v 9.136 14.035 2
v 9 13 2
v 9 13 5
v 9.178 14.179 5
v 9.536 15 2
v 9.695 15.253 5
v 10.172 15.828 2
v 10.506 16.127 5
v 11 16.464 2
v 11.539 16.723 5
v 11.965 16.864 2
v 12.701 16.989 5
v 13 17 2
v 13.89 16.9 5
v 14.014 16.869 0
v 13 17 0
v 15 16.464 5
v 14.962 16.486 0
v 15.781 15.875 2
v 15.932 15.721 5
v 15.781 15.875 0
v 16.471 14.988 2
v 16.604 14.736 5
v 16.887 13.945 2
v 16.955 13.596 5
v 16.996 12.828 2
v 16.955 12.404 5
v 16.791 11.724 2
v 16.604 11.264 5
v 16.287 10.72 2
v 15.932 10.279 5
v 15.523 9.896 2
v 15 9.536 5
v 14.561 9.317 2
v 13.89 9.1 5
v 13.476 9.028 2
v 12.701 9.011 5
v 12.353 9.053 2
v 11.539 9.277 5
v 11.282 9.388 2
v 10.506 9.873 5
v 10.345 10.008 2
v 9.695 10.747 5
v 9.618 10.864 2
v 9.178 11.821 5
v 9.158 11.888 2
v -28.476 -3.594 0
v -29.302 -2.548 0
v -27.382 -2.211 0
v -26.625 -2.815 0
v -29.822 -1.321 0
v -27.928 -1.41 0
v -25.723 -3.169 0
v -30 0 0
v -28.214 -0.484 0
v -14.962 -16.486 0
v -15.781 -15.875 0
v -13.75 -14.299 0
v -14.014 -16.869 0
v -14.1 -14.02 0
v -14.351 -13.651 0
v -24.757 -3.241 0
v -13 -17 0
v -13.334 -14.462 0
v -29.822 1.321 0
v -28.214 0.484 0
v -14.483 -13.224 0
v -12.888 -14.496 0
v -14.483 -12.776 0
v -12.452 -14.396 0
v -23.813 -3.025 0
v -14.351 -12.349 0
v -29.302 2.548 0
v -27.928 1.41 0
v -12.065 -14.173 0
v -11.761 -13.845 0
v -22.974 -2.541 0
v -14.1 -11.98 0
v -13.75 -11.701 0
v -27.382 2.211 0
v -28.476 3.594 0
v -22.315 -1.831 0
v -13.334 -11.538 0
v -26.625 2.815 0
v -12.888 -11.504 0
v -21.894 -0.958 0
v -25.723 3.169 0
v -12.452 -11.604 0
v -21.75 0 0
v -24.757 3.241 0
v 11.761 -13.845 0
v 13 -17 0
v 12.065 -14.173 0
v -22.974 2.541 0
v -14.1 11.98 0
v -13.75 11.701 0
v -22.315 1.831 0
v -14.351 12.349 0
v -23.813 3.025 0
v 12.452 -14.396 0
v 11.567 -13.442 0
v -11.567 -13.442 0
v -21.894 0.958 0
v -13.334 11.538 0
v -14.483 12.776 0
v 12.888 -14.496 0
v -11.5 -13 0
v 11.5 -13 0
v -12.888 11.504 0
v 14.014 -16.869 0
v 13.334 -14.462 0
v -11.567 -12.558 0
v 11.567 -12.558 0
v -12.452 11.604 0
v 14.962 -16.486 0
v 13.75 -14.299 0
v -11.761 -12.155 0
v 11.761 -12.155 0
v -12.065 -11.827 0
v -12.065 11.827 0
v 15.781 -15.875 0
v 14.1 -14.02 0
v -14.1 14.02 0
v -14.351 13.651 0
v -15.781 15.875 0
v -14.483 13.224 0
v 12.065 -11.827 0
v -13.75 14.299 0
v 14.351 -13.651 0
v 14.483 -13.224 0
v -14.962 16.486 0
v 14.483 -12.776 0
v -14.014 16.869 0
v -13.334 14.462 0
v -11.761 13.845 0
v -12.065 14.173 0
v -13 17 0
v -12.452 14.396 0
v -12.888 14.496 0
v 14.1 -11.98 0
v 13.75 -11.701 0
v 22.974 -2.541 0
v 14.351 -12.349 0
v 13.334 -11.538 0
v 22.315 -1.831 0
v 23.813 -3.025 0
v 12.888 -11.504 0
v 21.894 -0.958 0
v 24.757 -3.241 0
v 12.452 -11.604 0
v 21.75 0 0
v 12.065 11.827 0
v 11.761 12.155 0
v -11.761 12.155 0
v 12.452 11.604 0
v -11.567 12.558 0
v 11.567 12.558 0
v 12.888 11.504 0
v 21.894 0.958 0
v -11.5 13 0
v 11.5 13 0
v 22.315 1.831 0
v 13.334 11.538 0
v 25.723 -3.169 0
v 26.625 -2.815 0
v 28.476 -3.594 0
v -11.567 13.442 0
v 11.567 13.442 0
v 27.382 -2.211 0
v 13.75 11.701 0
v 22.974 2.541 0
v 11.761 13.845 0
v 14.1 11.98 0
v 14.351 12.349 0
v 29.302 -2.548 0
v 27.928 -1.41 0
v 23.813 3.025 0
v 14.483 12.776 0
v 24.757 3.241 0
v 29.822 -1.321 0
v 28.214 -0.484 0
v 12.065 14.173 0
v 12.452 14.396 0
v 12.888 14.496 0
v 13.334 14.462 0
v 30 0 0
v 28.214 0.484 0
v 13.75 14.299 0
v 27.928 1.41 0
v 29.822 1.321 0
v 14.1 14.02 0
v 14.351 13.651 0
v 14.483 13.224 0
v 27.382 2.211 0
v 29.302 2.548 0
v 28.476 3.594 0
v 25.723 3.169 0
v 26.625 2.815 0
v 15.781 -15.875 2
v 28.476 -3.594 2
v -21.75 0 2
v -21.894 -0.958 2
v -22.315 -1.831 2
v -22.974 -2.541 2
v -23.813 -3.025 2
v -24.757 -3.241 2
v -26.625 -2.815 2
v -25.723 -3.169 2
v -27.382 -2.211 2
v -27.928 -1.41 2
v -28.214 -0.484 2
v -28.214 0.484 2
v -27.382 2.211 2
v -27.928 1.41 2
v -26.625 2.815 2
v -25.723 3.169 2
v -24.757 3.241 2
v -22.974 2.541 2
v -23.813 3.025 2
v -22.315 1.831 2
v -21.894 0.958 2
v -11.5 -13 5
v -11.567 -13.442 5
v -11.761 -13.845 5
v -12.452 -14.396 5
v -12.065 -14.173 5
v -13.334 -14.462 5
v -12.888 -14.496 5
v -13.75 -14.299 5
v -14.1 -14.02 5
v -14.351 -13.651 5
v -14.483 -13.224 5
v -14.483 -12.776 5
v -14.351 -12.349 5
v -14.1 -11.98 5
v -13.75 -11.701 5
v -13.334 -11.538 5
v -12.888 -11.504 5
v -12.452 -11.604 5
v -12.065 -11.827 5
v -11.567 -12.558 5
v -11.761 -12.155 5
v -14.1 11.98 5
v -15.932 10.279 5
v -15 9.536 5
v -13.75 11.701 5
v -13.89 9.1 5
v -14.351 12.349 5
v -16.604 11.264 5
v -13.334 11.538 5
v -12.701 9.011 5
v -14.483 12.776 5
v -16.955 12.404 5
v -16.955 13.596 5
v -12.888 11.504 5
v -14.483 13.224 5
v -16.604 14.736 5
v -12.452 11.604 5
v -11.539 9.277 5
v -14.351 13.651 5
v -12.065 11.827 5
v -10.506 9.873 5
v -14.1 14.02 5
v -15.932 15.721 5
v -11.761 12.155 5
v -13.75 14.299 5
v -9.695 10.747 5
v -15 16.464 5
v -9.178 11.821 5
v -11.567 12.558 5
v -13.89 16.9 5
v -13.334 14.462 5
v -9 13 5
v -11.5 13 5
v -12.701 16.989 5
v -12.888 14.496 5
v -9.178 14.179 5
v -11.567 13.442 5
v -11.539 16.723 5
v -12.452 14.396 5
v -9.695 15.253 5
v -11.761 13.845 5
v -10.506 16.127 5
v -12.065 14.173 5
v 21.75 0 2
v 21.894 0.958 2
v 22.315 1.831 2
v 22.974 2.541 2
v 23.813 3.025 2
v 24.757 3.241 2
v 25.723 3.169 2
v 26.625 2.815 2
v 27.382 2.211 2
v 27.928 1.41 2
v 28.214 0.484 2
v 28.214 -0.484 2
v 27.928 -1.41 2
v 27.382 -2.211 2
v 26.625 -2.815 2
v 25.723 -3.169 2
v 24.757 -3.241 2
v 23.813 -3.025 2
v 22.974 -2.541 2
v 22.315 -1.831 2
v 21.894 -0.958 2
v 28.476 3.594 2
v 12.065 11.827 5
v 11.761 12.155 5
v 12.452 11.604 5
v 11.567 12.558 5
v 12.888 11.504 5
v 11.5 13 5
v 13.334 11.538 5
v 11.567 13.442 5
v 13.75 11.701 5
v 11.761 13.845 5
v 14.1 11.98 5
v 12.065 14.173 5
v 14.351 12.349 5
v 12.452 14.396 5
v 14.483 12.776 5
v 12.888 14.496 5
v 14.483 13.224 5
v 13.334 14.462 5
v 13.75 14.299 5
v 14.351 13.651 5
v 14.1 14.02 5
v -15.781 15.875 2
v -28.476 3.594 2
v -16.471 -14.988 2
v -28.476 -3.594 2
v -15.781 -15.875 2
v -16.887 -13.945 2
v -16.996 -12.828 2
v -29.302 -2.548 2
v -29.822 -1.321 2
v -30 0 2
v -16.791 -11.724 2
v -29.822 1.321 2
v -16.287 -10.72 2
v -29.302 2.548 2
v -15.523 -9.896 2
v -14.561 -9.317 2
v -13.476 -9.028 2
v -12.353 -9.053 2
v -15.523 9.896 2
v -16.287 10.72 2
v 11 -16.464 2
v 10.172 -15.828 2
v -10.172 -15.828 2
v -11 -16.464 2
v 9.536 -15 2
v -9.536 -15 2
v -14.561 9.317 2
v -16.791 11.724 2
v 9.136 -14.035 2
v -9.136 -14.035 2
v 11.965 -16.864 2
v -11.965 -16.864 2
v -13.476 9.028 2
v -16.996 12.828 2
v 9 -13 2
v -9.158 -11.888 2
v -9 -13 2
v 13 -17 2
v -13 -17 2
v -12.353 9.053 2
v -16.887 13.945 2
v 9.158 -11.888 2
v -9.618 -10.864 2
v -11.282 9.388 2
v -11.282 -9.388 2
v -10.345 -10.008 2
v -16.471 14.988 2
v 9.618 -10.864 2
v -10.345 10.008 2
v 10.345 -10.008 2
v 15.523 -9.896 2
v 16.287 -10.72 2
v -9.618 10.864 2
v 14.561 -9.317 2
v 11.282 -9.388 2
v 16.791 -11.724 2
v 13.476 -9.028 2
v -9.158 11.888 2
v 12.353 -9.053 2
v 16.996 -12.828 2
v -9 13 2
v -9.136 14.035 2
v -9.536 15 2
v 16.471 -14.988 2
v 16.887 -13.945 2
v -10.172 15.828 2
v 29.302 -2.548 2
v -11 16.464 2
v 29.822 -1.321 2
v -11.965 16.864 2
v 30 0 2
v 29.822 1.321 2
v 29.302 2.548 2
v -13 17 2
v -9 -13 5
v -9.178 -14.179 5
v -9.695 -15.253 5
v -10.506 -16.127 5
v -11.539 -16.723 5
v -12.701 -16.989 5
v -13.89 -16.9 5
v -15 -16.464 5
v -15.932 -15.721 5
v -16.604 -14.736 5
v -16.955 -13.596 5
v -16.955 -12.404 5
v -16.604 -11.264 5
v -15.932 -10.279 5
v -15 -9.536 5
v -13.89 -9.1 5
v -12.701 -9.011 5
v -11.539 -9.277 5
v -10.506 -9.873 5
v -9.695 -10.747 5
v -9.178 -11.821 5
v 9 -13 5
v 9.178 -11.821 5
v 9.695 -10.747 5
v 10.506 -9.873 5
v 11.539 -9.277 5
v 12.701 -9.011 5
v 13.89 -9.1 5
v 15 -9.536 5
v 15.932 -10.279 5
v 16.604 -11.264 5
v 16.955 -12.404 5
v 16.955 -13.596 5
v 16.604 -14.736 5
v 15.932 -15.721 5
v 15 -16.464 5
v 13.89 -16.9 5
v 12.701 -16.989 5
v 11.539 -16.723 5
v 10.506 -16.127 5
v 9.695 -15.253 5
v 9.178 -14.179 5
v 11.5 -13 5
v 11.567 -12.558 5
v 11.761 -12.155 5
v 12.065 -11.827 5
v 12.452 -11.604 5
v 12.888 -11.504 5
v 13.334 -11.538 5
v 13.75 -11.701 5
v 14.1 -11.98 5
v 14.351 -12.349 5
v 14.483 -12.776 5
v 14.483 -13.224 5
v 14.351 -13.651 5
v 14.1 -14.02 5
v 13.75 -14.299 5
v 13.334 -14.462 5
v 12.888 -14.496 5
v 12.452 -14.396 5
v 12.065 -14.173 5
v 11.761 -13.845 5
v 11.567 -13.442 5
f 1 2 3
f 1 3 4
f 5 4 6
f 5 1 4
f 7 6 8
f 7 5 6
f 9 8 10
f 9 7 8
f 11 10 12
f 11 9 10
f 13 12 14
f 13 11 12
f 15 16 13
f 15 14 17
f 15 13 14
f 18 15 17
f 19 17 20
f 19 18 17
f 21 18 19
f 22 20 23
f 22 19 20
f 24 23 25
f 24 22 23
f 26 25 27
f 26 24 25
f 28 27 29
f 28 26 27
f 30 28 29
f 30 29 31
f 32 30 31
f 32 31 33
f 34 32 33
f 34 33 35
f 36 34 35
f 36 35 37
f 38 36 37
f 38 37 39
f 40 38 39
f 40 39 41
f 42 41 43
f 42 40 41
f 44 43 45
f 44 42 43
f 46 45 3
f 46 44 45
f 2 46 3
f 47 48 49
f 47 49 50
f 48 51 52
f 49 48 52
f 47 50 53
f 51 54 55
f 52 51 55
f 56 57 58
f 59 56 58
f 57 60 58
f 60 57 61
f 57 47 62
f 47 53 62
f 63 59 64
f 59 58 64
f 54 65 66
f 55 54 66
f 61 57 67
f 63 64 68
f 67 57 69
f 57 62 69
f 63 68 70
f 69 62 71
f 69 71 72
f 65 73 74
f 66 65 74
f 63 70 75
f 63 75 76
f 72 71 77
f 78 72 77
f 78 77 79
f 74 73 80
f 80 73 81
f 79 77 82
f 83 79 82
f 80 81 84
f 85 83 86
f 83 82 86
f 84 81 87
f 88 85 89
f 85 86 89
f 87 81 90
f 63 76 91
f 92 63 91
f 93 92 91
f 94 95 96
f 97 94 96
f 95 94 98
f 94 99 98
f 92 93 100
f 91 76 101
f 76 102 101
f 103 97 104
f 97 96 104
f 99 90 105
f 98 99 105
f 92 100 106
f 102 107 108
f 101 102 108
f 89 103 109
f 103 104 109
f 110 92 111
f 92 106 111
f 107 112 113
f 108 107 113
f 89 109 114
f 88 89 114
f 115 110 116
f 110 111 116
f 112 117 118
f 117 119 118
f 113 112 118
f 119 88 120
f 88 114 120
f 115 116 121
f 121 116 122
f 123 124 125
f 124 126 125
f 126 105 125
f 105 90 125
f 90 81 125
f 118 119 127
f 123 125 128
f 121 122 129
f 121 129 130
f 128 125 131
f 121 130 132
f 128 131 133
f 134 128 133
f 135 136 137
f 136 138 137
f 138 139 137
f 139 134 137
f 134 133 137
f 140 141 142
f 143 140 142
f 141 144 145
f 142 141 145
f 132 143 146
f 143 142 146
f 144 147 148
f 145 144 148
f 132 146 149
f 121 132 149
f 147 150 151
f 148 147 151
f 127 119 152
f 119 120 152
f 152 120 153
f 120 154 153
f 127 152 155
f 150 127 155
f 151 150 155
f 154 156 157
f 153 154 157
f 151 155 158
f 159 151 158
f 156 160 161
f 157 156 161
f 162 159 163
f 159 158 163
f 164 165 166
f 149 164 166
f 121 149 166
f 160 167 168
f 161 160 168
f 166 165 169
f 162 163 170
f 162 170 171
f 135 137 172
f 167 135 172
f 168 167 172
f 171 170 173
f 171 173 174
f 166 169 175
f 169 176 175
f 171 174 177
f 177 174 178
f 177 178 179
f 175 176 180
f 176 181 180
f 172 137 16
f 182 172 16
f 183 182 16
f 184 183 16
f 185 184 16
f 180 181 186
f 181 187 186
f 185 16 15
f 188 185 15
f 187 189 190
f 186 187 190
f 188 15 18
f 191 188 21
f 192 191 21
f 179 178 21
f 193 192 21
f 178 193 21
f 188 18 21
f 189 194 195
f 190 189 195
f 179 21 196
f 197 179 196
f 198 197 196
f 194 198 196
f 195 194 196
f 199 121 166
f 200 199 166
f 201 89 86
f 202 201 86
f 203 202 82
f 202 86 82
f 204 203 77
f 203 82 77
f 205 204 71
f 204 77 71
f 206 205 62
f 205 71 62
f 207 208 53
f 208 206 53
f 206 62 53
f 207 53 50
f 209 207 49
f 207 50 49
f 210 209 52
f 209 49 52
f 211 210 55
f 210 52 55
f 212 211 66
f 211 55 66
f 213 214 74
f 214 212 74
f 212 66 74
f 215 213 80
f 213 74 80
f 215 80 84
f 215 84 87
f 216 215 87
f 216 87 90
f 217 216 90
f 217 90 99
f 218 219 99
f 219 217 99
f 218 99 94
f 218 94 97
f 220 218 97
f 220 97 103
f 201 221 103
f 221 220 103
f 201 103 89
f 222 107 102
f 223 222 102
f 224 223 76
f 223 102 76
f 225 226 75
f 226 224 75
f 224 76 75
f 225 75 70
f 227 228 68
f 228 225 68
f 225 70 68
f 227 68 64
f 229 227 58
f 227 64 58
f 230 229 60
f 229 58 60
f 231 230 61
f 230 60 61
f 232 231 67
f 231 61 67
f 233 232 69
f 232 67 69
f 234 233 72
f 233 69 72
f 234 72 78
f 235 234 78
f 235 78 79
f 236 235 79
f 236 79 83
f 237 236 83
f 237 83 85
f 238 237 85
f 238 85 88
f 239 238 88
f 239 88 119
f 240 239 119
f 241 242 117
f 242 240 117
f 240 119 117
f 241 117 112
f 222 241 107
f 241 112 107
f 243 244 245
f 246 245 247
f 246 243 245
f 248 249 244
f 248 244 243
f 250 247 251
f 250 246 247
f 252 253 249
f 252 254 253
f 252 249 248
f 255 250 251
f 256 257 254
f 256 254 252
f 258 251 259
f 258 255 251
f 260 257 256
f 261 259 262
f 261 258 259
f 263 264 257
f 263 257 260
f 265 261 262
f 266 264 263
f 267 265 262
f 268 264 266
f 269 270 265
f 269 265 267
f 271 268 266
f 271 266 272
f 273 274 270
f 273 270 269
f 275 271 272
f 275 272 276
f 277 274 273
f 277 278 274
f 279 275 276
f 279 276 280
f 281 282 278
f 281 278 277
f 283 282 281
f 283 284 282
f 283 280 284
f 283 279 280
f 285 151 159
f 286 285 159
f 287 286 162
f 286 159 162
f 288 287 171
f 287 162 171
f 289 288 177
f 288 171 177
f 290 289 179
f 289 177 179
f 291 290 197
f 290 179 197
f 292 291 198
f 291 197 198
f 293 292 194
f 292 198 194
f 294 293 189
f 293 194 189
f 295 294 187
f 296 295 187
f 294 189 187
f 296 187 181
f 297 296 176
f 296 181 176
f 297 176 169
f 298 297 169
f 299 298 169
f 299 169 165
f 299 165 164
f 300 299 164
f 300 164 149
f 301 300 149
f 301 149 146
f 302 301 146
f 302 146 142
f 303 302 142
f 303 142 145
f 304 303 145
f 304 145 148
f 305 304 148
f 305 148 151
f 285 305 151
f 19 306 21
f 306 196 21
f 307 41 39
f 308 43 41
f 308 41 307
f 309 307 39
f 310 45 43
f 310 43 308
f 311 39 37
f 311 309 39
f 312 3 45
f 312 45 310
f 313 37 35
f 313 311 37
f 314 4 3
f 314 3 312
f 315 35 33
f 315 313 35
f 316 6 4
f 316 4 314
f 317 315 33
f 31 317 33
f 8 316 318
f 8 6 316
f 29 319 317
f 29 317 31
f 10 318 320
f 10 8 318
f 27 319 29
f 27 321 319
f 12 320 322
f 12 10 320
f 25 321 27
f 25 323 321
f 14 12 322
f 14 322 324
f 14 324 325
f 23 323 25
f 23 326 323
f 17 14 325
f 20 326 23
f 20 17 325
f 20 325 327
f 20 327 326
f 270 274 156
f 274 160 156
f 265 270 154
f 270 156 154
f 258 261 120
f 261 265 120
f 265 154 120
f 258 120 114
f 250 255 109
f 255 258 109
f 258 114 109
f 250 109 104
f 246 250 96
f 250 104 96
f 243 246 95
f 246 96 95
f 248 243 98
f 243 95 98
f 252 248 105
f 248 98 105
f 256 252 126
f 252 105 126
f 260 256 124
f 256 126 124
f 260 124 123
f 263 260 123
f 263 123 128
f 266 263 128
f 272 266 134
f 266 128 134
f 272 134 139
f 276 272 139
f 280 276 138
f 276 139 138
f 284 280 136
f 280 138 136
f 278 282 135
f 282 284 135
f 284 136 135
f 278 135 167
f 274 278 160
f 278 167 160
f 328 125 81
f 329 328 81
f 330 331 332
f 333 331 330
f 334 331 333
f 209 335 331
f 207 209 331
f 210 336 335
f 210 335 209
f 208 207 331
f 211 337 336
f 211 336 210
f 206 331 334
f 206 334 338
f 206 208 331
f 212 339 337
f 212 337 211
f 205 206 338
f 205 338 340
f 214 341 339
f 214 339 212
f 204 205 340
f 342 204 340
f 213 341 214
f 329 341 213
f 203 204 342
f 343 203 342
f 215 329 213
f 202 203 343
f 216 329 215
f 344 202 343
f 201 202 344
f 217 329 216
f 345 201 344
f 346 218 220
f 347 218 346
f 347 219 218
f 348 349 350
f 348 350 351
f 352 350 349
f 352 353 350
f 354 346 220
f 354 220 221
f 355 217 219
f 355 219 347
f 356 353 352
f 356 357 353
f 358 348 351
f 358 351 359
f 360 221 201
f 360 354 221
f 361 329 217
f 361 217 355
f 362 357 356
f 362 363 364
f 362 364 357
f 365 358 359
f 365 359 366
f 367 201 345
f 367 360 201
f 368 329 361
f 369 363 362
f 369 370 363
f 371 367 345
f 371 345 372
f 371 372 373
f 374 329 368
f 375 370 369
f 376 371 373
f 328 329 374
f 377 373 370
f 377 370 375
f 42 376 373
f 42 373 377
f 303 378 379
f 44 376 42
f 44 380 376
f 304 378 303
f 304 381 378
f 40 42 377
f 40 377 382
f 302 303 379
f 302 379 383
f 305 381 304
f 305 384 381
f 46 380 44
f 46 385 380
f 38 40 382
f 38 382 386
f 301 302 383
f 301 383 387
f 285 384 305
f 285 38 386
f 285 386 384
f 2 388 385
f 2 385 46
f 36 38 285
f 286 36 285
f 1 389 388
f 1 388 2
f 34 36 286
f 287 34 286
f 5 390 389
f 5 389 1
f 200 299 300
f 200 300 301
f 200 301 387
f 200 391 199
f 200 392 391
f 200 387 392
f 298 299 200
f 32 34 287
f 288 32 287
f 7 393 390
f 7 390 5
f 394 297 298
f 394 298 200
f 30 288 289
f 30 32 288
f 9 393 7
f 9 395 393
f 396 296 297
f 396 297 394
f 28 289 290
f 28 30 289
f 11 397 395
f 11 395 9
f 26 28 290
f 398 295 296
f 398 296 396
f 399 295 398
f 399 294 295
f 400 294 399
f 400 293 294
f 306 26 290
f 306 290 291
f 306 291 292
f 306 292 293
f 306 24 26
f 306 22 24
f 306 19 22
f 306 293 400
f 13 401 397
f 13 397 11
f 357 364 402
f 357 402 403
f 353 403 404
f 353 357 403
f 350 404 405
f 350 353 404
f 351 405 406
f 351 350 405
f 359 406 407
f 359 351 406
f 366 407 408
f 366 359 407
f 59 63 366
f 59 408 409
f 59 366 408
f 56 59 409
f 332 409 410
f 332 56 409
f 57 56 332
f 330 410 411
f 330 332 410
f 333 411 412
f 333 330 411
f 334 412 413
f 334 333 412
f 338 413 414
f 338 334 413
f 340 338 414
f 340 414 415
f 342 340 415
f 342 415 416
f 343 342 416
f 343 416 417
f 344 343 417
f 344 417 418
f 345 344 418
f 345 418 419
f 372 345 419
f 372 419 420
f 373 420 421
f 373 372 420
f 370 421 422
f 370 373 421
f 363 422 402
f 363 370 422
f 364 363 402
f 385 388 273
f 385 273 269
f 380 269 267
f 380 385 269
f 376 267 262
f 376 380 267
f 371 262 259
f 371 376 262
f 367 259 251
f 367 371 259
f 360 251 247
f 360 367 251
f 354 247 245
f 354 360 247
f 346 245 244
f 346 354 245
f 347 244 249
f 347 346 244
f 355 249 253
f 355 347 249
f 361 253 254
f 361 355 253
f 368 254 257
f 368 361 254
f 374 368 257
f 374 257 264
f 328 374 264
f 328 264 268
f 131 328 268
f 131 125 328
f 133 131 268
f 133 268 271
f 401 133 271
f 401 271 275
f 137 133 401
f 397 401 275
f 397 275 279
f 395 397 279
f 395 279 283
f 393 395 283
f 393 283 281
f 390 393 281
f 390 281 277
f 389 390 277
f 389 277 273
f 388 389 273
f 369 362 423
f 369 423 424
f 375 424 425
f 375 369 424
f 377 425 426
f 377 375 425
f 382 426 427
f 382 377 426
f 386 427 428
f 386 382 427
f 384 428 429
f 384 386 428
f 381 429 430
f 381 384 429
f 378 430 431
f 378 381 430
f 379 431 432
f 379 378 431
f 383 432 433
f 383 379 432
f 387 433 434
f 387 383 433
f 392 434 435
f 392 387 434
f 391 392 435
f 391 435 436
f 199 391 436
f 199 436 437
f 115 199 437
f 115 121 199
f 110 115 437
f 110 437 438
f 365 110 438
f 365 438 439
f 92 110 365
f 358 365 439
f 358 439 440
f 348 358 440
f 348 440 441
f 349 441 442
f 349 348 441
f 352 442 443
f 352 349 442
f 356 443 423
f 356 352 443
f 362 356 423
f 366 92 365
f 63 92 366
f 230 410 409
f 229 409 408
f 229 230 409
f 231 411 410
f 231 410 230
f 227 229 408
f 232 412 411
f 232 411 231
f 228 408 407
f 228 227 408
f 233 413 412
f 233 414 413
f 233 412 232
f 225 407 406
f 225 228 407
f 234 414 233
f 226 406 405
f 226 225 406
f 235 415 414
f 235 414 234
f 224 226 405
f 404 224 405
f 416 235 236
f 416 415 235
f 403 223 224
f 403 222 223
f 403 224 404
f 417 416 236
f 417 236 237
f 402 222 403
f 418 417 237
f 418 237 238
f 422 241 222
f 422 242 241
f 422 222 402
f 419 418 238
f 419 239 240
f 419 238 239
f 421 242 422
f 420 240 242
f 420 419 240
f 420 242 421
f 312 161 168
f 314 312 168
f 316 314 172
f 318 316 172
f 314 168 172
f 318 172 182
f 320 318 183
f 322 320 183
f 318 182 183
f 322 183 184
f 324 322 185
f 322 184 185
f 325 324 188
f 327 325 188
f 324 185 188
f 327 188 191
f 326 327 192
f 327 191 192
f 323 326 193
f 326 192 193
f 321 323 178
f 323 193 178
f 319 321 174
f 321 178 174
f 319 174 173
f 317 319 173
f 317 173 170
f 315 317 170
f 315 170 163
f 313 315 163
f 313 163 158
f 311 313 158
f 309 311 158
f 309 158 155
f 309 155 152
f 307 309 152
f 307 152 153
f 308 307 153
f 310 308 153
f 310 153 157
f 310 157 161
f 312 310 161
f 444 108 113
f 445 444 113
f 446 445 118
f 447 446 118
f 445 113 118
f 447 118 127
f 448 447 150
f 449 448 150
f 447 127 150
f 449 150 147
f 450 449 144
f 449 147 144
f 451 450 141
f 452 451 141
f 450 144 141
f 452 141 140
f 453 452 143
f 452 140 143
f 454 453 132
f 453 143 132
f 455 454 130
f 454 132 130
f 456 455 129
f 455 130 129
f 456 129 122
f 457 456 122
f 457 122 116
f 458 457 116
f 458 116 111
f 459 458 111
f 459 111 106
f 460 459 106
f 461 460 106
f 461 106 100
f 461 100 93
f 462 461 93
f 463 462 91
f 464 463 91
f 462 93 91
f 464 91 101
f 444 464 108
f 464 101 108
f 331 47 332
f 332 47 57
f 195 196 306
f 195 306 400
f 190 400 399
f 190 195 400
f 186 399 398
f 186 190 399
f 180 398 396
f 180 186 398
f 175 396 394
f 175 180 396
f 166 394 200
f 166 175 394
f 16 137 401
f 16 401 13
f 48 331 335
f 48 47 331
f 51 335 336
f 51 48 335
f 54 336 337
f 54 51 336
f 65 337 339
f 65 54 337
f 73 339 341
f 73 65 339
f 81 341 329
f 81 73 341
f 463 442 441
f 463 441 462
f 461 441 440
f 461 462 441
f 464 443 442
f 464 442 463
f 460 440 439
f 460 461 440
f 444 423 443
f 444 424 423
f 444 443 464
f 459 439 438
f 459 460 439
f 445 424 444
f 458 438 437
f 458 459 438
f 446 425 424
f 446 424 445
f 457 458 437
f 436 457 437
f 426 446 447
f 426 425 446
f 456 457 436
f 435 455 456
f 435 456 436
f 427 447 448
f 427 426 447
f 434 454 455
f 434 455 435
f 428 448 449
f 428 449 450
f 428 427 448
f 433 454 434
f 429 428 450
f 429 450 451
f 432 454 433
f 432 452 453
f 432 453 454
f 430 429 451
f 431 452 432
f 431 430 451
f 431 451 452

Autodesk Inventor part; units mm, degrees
ref_plane "YZ Plane" through (0, 0, 0) normal (1, 0, 0) x (0, 1, 0)
ref_plane "XZ Plane" through (0, 0, 0) normal (0, 1, 0) x (-1, 0, 0)
ref_plane "XY Plane" through (0, 0, 0) normal (0, 0, 1) x (1, 0, 0)
sketch "Sketch1" plane through (0, 0, 0) normal (0, 0, 1) x (1, 0, 0)
  line L0 (-13, 13) -> (13, 13) construction
  line L1 (13, 13) -> (13, -13) construction
  line L2 (13, -13) -> (-13, -13) construction
  line L3 (-13, -13) -> (-13, 13) construction
  circle A0 centre (-13, 13) radius 1.5
  circle A1 centre (-13, -13) radius 1.5
  circle A2 centre (-13, 13) radius 4
  circle A3 centre (-13, -13) radius 4
  line L4 (-15.7812, 15.8749) -> (-28.4765, 3.5936)
  arc A4 (-28.4765, 3.5936) -> (-28.4765, -3.5936) centre (-25, 0) ccw
  line L5 (-28.4765, -3.5936) -> (-15.7812, -15.8749)
  line L6 (-13, 17) -> (0, 17)
  line L7 (0, 17) -> (0, -17)
  line L8 (0, -17) -> (-13, -17)
  circle A5 centre (-25, 0) radius 3.25
  point P0 (0, 0)
  point P1 (0, 13)
  point P2 (-13, 0)
  point P3 (0, 0)
  dimension "d0" = 26
  dimension "d1" = 3
  dimension "d3" = 8
  dimension "d5" = 10
  dimension "d6" = 25
  dimension "d7" = 6.5
extrude "Extrusion1" add sketch "Sketch1" along normal blind 2
extrude "Extrusion2" add sketch "Sketch1" along normal blind 5 contours A2 | A3
mirror "Mirror1" about plane through (0, 0, 0) normal (1, 0, 0)
properties part number "adapter_board_mount"
